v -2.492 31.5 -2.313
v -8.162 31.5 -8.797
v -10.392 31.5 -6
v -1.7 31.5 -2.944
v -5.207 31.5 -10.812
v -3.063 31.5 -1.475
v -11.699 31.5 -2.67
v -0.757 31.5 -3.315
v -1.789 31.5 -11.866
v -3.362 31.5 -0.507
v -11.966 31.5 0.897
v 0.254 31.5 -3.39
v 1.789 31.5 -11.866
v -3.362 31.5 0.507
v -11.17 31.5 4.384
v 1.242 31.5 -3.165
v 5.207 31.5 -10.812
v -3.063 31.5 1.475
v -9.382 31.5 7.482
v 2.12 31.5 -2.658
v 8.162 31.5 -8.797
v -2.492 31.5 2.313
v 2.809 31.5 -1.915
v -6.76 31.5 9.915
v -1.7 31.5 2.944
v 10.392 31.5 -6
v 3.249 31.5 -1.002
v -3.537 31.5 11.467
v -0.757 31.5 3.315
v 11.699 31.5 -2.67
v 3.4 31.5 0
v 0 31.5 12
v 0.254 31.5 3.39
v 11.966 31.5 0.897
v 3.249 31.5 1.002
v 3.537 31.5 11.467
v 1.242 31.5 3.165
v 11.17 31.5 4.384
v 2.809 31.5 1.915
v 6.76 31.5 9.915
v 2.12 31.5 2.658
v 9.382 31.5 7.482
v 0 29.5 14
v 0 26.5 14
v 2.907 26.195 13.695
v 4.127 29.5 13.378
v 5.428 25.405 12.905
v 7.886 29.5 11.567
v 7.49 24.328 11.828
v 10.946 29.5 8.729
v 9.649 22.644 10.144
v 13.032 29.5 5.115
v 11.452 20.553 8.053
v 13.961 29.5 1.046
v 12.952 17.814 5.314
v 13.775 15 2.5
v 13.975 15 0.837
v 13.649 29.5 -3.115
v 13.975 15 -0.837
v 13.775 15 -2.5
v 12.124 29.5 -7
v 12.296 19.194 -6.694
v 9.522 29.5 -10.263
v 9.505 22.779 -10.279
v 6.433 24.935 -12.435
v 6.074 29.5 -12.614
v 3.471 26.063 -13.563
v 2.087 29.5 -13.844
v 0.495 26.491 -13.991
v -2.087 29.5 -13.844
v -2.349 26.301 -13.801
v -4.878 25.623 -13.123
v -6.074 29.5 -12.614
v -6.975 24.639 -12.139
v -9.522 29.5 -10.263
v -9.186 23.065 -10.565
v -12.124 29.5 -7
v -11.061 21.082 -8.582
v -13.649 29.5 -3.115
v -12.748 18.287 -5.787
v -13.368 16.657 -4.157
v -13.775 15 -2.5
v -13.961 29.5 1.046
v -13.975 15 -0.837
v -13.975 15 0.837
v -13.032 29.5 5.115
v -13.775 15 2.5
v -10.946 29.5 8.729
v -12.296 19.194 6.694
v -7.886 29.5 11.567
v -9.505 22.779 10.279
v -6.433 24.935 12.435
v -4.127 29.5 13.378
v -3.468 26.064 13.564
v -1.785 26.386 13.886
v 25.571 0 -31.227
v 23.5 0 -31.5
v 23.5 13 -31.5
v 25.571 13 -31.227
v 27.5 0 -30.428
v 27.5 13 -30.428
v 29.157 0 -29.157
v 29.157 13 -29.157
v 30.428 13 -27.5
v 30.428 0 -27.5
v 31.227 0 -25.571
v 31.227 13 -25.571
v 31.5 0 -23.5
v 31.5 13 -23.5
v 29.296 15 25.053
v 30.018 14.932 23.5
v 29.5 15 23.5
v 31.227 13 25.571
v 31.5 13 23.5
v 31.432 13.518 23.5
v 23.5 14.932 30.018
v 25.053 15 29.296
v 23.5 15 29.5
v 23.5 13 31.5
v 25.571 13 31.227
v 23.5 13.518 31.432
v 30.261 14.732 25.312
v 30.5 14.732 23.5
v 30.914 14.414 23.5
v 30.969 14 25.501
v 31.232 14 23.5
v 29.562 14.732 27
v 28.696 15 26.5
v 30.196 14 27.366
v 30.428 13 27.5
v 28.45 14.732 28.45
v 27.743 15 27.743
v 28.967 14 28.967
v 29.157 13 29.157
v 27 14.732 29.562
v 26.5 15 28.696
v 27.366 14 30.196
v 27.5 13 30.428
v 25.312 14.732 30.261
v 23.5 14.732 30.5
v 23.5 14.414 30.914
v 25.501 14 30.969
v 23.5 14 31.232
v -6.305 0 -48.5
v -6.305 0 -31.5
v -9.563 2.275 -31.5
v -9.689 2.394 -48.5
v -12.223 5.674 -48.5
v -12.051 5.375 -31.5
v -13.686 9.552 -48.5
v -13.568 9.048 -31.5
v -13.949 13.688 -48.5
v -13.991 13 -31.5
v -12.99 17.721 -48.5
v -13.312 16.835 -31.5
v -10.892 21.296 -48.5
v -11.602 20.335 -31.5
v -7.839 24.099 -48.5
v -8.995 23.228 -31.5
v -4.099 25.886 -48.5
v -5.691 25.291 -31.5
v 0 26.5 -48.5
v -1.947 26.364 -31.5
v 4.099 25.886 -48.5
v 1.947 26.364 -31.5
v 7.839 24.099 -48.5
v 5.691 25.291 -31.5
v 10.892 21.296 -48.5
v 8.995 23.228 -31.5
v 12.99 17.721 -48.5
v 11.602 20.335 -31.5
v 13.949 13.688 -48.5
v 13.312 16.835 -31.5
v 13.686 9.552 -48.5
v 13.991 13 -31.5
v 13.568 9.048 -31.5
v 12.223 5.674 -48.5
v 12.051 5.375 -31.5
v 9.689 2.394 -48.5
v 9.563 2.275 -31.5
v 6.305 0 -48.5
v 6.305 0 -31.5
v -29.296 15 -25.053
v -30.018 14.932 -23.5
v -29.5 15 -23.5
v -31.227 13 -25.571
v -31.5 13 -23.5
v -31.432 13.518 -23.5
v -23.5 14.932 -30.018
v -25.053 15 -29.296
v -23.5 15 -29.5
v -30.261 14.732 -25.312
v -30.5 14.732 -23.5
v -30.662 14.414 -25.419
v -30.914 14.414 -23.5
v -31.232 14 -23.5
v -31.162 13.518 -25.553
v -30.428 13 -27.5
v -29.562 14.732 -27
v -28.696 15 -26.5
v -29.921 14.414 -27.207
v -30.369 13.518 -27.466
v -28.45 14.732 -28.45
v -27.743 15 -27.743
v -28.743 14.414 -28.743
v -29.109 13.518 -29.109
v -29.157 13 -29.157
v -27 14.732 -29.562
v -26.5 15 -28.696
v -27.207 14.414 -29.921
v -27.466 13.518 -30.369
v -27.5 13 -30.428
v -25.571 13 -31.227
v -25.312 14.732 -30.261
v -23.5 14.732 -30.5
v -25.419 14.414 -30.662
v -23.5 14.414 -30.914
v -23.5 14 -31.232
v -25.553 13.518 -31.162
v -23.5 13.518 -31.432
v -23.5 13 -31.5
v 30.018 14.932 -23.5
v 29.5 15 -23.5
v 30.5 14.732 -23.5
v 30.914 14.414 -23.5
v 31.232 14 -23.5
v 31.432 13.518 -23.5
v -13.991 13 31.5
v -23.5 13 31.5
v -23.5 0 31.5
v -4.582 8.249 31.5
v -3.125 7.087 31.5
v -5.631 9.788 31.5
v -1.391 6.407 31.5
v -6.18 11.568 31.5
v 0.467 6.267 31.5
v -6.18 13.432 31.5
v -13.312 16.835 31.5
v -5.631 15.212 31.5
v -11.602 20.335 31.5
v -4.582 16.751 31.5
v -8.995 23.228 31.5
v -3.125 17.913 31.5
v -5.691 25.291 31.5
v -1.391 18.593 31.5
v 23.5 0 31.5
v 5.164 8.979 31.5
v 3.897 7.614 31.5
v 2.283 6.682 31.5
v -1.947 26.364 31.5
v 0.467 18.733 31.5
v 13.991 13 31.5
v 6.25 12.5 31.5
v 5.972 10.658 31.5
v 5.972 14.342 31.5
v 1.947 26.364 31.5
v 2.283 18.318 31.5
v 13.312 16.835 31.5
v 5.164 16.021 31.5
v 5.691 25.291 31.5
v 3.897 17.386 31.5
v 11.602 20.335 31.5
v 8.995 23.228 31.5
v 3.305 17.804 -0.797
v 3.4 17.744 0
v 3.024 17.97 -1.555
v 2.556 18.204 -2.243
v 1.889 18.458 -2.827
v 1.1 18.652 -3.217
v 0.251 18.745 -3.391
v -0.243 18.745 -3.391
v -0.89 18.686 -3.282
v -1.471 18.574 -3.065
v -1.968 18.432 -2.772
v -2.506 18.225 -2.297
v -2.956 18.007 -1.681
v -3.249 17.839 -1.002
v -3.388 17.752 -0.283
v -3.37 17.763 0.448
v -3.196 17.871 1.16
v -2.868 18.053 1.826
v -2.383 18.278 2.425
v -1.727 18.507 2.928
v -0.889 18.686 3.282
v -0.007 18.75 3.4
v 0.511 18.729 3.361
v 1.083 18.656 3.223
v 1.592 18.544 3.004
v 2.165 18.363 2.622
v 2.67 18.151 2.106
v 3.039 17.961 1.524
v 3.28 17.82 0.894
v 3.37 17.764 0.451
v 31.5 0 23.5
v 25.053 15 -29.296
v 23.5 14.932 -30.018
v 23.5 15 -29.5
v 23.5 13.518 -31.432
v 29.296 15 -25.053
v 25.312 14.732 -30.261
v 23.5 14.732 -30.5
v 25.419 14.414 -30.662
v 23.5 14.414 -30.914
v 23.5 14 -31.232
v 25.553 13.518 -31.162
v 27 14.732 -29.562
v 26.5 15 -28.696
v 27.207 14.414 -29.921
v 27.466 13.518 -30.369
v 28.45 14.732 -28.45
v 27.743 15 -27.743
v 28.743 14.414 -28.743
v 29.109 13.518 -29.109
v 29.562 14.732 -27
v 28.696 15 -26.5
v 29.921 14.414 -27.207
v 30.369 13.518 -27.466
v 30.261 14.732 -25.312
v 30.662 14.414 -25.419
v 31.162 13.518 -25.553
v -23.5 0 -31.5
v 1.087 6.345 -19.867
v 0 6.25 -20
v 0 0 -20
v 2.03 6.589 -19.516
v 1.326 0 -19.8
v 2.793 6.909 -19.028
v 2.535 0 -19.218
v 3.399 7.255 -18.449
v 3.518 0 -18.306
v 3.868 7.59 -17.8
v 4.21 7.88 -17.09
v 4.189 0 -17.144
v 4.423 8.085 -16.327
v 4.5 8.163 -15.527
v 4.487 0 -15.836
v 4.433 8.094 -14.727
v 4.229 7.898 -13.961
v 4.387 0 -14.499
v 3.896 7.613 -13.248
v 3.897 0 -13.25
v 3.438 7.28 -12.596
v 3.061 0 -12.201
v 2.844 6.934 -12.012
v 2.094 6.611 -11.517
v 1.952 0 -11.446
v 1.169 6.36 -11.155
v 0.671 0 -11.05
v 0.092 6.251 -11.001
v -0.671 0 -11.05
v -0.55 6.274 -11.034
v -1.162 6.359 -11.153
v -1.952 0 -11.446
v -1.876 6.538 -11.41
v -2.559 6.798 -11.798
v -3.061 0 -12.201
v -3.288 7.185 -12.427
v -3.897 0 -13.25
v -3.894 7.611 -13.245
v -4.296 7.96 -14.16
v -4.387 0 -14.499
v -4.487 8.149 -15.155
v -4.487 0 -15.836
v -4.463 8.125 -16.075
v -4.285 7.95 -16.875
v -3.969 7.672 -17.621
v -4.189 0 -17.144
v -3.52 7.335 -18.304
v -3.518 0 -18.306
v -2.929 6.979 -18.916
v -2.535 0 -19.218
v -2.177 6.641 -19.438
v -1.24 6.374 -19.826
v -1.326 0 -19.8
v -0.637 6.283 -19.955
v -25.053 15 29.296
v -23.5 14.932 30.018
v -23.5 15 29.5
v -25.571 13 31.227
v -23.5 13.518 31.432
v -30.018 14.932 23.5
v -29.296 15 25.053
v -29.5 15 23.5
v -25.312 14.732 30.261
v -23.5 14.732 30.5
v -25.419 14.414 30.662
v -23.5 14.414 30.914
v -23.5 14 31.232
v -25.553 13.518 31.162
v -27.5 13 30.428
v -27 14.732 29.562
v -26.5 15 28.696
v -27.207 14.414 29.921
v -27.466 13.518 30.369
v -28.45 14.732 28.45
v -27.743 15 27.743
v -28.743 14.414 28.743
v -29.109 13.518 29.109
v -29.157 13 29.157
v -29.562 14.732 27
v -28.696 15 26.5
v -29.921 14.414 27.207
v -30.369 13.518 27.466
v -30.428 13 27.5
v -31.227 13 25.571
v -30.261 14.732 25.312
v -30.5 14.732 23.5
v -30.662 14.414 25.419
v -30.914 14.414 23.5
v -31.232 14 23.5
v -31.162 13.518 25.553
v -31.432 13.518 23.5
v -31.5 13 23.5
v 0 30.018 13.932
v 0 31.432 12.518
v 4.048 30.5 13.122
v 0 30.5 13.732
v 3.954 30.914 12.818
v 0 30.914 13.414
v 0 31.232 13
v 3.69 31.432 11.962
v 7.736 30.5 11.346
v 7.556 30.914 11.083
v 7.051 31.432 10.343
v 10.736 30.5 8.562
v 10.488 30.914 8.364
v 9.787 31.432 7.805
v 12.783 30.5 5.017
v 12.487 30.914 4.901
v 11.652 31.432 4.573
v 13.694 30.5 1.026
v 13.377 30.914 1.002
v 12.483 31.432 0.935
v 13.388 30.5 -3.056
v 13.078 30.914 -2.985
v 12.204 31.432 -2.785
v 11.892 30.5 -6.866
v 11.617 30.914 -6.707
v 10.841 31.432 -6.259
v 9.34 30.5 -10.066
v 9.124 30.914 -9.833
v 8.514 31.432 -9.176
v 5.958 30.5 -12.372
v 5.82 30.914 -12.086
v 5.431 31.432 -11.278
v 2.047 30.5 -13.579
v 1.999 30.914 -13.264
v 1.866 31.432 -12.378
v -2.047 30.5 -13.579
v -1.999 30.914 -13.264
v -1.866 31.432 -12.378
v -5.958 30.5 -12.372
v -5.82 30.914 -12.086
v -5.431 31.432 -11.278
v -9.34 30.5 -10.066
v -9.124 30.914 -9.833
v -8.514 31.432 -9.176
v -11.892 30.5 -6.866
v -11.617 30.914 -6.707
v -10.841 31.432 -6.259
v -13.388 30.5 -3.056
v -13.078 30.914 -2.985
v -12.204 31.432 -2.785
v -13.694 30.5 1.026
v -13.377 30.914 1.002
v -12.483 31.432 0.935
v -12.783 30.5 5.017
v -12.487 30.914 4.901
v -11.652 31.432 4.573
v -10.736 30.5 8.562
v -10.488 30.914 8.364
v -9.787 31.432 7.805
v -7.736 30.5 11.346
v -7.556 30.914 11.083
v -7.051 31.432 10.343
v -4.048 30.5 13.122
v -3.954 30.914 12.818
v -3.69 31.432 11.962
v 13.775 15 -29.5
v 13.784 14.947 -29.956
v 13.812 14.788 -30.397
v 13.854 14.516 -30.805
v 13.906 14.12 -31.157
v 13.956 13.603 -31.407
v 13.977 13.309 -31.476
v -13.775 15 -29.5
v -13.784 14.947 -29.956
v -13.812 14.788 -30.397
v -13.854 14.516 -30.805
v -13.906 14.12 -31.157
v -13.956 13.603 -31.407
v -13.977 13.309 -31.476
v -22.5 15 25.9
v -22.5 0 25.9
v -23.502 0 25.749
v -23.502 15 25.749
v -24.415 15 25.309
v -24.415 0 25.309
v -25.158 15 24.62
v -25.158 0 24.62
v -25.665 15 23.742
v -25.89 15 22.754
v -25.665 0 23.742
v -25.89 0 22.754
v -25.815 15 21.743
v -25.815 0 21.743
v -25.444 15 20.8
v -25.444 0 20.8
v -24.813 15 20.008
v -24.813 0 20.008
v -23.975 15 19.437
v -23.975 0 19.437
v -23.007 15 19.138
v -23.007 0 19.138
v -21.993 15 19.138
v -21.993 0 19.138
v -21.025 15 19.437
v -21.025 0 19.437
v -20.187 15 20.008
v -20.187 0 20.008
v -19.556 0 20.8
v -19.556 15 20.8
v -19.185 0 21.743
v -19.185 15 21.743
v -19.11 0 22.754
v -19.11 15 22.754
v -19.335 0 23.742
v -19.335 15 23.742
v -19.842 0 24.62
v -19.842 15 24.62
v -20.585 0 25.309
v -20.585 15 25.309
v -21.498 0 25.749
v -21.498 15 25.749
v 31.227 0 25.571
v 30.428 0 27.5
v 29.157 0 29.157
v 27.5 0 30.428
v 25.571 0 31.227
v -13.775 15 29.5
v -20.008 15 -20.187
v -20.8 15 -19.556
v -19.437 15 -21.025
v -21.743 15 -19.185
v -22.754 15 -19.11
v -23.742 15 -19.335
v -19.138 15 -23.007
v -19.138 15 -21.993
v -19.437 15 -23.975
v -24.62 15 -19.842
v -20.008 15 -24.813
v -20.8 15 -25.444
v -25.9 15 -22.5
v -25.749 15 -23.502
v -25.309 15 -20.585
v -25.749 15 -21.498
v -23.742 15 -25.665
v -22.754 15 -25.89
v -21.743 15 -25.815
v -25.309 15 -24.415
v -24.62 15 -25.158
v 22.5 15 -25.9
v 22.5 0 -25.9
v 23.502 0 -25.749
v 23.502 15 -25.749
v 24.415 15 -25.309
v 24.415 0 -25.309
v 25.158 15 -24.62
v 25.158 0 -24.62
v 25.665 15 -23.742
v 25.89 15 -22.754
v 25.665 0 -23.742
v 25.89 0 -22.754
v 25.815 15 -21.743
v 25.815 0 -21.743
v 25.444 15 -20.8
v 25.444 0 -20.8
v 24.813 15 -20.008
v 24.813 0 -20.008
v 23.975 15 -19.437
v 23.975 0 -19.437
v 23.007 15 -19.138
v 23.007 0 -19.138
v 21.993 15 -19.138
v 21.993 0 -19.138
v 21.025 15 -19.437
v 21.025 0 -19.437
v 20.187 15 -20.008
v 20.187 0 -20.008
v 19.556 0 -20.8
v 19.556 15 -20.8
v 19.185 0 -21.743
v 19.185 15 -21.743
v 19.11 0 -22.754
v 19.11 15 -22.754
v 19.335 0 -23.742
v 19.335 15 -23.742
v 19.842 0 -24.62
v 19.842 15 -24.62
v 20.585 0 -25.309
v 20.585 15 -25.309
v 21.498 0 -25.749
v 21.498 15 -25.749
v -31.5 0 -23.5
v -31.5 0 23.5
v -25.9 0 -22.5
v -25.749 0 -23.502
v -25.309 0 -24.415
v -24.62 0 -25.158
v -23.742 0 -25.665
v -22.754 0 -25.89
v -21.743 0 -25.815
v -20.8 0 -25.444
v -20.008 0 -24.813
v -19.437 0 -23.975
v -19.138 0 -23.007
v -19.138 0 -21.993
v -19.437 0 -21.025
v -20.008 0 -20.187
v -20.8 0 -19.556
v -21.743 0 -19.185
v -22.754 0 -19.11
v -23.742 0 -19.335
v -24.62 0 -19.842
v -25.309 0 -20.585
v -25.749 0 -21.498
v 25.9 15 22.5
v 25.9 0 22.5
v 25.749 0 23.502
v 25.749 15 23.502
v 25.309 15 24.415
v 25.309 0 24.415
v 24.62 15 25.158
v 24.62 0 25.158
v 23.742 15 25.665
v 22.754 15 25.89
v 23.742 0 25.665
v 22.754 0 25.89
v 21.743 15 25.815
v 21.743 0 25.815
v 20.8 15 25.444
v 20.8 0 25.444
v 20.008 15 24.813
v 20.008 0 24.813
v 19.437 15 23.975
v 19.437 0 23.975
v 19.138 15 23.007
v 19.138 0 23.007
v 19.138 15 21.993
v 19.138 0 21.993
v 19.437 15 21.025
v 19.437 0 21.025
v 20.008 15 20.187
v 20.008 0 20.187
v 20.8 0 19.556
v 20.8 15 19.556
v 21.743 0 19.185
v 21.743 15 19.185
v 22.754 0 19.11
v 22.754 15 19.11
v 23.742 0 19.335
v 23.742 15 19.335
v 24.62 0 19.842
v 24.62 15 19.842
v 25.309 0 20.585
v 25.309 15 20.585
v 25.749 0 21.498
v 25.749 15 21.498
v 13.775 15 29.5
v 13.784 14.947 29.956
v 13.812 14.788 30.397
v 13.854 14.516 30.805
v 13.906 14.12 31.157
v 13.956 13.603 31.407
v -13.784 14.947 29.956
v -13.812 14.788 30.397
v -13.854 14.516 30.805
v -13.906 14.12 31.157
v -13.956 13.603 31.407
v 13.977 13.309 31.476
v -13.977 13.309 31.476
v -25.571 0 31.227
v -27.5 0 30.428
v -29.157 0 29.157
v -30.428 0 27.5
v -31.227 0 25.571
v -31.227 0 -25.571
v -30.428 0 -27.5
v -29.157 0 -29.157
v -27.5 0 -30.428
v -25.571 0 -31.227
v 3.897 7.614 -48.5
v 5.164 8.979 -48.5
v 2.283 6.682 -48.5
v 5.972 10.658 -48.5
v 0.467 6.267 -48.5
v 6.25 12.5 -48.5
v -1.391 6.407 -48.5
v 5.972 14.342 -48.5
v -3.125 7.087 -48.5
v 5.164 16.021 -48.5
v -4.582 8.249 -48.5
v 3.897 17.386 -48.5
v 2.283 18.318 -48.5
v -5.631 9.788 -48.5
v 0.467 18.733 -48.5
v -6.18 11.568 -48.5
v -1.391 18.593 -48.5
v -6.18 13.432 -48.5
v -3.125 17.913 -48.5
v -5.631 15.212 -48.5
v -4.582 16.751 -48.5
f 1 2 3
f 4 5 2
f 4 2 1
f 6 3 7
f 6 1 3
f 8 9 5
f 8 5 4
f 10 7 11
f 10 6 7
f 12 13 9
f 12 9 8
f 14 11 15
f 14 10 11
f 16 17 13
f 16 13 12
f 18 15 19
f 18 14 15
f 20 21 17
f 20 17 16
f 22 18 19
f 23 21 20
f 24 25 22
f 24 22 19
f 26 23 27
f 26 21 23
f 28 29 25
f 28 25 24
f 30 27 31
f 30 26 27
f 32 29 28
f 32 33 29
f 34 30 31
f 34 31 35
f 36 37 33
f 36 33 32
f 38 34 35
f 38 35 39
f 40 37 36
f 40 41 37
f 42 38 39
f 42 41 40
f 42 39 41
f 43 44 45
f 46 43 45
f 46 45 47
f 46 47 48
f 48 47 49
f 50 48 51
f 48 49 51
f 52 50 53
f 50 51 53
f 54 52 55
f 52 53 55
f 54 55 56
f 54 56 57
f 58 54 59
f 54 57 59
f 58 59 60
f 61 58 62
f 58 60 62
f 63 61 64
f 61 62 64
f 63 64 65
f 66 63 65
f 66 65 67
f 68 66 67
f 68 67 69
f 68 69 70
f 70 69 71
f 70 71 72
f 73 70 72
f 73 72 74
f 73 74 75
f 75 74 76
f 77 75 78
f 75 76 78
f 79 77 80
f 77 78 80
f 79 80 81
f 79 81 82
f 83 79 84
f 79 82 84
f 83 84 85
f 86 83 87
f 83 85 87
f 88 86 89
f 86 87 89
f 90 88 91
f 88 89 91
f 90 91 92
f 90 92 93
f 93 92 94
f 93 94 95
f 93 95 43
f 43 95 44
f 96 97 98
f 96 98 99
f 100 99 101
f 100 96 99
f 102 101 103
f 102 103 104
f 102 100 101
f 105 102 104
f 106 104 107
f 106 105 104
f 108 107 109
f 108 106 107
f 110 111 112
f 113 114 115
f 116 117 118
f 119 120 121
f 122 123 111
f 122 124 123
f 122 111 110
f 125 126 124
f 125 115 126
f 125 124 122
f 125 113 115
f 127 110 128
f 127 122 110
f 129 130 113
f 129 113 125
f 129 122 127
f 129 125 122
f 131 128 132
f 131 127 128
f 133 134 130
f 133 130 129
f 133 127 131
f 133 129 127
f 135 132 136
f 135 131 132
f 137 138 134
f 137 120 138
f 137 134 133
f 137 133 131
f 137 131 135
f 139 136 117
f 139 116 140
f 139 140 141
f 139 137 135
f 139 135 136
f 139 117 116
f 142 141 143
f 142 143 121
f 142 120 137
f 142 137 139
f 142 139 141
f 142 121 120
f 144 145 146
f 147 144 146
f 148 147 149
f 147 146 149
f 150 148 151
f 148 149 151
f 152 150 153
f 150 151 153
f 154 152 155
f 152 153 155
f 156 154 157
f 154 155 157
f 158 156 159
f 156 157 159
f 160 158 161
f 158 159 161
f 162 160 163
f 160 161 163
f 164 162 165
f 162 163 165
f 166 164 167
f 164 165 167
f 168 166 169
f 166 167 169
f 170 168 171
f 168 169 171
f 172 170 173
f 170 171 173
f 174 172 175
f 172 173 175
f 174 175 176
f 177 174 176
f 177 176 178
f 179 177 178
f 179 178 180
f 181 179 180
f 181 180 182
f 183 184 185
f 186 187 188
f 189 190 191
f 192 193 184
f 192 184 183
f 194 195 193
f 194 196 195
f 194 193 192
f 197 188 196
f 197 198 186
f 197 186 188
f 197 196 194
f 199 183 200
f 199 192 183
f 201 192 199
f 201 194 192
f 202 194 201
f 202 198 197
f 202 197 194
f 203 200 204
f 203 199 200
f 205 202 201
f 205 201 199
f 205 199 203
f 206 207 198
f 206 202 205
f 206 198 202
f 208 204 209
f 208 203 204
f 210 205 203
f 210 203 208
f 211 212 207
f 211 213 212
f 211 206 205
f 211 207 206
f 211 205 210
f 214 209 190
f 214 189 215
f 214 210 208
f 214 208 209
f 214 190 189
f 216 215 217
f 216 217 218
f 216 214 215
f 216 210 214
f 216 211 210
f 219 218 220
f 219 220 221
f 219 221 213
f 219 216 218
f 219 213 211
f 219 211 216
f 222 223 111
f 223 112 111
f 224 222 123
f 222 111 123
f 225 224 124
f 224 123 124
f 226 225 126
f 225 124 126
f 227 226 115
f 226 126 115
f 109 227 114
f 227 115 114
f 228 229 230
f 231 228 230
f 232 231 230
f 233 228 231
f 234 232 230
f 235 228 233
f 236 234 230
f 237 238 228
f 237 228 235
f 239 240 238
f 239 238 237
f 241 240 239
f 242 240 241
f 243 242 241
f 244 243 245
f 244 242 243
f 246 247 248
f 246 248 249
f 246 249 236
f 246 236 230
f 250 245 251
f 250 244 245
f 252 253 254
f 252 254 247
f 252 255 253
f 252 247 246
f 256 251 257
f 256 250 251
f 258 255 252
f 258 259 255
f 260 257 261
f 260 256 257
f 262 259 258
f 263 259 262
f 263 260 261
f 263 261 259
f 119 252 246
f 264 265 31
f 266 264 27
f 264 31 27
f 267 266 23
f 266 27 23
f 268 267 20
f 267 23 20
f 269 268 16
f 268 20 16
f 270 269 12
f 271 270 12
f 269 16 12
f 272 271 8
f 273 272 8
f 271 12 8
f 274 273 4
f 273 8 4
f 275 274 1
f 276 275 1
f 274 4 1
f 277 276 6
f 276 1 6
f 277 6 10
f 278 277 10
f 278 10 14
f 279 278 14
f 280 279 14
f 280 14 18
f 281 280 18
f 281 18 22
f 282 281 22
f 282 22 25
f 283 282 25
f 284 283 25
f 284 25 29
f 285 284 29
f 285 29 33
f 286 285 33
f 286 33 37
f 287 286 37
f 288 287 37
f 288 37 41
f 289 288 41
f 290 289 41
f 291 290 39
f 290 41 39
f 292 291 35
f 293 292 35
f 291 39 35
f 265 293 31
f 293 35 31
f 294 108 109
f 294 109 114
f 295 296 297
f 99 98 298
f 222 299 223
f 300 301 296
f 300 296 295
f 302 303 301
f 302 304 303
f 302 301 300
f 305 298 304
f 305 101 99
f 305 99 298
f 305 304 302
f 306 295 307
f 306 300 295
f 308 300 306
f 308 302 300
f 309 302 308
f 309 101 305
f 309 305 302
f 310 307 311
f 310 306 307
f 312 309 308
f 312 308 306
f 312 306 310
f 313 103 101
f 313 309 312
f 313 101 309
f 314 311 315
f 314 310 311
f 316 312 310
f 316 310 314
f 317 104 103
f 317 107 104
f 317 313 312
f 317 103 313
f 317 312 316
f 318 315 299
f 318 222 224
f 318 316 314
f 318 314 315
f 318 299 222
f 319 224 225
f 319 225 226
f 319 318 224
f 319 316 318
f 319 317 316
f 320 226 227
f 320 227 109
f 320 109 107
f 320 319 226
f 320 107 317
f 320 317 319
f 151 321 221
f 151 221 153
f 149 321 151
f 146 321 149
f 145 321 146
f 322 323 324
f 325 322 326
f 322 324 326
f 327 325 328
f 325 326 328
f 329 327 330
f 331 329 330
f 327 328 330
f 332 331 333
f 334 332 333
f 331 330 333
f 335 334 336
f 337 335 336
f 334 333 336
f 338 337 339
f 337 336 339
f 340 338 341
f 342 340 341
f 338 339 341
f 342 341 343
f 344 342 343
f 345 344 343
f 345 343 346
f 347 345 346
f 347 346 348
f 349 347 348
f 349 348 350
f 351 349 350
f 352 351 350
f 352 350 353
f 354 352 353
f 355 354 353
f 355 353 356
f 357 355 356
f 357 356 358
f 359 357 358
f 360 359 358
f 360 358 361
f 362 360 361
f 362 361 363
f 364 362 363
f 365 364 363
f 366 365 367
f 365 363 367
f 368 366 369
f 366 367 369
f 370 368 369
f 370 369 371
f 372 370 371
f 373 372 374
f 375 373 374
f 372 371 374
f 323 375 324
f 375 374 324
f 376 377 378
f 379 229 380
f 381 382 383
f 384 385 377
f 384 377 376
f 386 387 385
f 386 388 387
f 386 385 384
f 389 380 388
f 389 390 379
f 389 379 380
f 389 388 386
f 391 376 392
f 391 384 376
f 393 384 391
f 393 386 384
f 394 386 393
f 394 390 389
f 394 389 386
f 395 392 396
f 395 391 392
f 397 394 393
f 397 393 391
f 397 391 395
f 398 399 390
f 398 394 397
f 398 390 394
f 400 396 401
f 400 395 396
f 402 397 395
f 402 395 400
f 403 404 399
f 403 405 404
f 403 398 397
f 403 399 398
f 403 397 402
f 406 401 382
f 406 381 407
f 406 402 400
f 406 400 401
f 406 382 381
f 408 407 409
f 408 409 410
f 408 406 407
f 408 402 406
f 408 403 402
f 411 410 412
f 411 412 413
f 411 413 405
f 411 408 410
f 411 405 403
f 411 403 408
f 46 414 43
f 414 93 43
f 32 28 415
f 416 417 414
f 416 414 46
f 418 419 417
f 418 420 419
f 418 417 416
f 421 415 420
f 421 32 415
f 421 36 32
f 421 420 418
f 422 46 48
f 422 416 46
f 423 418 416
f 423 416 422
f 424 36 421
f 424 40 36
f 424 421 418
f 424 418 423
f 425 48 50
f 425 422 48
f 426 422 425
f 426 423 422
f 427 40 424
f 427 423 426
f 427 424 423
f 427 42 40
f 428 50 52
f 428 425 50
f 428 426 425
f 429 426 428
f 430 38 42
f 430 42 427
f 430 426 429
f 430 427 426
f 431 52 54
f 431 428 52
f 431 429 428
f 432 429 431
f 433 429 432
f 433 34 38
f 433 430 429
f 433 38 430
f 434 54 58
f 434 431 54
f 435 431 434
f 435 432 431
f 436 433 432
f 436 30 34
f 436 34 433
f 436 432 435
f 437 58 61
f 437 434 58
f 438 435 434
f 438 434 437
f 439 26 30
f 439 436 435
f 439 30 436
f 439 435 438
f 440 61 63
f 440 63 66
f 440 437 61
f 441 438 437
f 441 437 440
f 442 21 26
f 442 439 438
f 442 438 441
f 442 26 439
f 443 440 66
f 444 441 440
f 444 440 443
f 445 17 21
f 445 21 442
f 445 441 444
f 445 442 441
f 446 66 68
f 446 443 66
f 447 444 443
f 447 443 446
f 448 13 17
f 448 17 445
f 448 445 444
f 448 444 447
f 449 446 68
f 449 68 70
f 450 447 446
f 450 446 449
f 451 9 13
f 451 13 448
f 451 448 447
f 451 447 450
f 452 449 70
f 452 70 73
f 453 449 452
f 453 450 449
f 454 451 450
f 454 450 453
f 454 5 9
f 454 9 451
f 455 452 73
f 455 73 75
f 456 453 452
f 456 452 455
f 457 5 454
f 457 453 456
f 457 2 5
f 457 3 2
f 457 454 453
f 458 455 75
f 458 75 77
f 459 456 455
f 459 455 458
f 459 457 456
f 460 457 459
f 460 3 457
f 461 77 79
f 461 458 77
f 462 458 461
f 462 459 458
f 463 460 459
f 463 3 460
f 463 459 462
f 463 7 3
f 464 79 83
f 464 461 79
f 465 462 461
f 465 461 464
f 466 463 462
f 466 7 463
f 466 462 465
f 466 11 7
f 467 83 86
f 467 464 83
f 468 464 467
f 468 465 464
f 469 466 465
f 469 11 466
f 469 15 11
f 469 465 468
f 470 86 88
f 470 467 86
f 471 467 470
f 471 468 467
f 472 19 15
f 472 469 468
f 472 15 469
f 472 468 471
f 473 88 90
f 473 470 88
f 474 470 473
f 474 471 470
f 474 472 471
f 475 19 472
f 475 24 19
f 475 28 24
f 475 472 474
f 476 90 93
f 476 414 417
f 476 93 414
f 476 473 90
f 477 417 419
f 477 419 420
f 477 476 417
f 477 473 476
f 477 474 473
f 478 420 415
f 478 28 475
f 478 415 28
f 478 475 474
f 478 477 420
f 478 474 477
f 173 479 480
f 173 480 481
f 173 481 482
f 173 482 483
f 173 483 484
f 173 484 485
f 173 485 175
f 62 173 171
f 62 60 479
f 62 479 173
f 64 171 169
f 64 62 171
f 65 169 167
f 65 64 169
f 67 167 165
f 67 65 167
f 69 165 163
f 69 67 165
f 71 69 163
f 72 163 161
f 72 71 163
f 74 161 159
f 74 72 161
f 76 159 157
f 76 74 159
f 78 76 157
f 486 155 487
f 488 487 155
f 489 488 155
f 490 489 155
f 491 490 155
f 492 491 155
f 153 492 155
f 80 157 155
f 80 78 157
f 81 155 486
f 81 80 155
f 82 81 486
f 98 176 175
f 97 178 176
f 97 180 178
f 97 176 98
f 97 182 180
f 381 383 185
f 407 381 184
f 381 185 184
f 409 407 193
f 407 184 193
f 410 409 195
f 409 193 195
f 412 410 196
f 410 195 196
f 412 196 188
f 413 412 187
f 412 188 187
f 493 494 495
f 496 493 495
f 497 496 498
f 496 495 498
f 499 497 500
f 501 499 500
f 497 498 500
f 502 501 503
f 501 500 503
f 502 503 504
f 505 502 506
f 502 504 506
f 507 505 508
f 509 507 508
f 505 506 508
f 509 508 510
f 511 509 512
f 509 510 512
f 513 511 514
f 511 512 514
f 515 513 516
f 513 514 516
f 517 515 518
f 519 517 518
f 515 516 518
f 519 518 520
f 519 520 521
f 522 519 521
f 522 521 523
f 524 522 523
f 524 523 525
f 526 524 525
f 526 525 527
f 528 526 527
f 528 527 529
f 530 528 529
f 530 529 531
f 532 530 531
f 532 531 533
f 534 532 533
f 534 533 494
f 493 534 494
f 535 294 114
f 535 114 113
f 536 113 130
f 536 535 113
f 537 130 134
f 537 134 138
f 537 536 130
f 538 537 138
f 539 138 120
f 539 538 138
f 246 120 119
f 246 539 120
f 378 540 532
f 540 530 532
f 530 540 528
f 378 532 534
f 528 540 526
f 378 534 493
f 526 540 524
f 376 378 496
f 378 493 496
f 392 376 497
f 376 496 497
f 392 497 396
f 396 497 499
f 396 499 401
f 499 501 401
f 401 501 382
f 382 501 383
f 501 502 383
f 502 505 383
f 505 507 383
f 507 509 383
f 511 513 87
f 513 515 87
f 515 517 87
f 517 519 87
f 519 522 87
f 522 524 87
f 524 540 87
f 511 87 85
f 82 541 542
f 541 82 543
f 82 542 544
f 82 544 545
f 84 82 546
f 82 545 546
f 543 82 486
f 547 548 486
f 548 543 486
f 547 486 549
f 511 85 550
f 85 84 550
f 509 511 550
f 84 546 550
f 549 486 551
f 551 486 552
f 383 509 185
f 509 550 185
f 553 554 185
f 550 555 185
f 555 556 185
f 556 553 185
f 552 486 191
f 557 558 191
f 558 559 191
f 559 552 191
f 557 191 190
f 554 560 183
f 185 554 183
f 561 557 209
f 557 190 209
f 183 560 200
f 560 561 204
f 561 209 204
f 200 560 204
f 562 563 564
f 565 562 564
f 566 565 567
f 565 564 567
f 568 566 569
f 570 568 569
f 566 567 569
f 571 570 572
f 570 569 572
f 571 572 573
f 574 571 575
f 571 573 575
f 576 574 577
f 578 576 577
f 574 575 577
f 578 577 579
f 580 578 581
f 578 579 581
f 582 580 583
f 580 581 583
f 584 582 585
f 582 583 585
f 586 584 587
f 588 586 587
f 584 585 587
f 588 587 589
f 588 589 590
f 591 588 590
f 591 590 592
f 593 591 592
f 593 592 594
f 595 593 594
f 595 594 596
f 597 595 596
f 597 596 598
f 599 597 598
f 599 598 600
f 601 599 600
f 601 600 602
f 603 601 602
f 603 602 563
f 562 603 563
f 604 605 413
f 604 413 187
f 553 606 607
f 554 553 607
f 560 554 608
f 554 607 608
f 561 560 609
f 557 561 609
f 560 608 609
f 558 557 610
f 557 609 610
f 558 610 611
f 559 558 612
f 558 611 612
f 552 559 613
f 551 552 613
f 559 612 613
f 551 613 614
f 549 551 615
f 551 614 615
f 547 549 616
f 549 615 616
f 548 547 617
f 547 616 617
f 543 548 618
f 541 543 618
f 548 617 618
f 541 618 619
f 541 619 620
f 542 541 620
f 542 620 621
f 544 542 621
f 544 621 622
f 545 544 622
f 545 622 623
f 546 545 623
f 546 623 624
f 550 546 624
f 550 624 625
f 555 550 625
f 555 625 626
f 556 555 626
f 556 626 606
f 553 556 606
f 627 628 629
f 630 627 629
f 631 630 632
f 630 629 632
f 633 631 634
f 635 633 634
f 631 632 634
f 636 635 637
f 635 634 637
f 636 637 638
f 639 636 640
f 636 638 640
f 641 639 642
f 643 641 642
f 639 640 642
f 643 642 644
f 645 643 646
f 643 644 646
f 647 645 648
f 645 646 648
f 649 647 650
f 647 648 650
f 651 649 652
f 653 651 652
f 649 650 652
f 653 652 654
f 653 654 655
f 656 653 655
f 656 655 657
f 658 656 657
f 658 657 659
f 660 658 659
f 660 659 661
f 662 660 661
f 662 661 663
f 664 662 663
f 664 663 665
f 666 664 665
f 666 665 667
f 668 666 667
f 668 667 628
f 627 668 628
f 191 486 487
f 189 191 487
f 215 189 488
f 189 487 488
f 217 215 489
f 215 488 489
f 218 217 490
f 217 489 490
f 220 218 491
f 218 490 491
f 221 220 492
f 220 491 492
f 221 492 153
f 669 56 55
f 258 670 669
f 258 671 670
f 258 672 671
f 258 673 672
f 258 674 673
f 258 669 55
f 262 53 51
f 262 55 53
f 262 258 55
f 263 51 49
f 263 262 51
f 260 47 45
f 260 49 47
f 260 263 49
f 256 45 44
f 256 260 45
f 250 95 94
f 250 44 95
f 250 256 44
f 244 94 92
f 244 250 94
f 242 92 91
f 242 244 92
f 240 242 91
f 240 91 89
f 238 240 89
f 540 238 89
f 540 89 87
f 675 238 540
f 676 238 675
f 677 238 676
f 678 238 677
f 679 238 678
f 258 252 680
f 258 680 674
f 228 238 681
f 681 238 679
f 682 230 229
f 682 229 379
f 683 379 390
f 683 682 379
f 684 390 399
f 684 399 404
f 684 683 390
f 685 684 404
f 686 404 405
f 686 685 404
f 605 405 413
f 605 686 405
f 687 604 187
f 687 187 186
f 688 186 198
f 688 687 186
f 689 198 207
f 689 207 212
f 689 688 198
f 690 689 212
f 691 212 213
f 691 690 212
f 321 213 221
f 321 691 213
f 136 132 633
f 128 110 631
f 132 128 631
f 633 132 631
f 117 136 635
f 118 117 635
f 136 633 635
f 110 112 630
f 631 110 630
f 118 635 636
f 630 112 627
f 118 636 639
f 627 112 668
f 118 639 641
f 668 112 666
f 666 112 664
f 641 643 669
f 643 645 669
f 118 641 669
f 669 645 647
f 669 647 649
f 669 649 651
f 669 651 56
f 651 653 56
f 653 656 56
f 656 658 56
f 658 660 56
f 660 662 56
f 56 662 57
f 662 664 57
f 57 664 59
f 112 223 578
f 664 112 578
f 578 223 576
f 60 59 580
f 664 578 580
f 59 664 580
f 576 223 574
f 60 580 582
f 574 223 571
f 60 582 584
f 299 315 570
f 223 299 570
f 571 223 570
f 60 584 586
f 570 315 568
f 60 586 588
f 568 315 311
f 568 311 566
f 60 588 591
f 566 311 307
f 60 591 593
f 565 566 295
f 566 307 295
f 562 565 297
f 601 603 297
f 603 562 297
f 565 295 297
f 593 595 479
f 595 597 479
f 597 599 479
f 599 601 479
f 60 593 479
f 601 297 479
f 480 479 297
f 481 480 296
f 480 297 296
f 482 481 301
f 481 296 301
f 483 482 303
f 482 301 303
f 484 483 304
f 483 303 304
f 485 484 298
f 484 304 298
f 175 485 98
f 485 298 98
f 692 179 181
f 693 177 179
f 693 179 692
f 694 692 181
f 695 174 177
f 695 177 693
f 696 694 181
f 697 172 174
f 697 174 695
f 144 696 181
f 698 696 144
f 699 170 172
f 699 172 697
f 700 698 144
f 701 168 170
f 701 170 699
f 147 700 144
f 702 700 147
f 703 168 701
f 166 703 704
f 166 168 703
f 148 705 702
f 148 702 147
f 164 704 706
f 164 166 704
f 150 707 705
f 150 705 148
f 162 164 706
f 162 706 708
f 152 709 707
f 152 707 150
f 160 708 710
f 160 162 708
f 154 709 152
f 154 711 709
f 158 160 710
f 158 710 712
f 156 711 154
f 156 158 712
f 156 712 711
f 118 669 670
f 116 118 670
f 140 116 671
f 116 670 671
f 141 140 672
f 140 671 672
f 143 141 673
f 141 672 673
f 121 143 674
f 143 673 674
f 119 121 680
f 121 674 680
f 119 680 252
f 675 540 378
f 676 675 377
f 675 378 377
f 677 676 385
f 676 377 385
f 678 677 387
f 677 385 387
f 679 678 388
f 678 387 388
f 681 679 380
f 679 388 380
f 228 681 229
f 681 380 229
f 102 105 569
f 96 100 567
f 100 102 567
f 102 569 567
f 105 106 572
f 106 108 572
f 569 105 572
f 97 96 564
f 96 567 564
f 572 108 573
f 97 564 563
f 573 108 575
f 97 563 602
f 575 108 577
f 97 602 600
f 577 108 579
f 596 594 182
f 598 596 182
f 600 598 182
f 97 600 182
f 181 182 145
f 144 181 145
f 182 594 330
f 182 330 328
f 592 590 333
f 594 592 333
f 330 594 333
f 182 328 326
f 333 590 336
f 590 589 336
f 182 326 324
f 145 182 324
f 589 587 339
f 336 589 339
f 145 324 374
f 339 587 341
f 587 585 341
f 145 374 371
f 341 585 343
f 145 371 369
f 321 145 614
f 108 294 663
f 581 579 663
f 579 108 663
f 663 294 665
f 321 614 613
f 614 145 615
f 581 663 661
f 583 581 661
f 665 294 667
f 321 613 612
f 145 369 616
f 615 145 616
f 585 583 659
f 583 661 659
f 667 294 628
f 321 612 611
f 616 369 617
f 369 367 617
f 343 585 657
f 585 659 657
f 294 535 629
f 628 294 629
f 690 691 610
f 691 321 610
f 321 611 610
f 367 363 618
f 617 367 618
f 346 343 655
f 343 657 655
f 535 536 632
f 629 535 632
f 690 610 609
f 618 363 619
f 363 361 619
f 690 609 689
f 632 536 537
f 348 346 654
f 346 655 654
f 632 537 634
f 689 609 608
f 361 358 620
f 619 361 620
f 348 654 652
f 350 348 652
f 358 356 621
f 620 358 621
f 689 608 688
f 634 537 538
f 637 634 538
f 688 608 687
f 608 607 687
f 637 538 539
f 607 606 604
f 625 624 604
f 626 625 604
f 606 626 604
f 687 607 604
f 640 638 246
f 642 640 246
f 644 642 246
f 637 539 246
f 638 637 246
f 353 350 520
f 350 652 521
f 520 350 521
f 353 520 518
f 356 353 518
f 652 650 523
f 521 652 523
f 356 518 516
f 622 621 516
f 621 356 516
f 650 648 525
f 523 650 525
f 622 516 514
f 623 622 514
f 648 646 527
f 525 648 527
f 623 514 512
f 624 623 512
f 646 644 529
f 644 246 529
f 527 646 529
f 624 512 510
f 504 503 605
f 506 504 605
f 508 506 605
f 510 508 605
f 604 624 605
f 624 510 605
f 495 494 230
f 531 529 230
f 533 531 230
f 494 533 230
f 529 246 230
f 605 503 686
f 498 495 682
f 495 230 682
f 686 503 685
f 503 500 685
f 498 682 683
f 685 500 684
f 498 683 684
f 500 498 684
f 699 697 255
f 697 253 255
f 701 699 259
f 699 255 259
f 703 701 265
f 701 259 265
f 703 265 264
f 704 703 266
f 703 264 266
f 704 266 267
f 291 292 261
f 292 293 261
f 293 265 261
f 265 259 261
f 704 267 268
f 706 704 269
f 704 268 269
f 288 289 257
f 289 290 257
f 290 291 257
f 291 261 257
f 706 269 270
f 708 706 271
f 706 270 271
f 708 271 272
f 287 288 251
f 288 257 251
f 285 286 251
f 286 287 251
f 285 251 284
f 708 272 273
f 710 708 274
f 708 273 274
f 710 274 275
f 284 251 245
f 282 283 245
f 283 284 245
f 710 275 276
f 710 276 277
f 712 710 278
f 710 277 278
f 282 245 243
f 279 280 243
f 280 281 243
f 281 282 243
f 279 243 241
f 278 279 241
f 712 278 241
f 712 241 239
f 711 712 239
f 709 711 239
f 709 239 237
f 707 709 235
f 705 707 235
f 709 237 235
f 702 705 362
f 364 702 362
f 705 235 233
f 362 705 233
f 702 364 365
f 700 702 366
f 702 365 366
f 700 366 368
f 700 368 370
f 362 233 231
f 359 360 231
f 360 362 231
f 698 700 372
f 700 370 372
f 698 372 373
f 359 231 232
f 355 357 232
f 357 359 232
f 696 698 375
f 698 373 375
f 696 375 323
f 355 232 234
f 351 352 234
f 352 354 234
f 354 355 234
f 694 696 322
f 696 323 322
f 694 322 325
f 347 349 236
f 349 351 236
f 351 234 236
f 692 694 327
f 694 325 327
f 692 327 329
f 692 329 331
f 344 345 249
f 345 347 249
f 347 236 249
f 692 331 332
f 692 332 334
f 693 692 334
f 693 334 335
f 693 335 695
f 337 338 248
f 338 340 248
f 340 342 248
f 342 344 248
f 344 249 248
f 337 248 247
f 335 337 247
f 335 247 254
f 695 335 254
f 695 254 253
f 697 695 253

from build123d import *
from build123d.topology import SkipClean

# Parameters (mm, degrees)
EXTRUDE_1_DEPTH          = 15
SKETCH_2_R               = 14
EXTRUDE_2_DEPTH          = 16.5
FILLET_1_R               = 2
EXTRUDE_3_DEPTH          = 17
EXTRUDE_START            = 63
EXTRUDE_4_DEPTH          = 63
M14X1_5_1_D              = 12.5
HOLE_WIZARD_M8_1_REACH   = 67.854
HOLE_WIZARD_M8_1_BORE_R  = 3.4
CUT_EXTRUDE_1_REACH      = 67.854
CUT_EXTRUDE_1_END_RADIUS = 6.25
SKETCH_9_R               = 4.5
HOLE_WIZARD_M8_2_D       = 6.8
PATTERN_CIRCULAR_1_COUNT = 4


with BuildPart() as part:
    # 草图1 → 凸台-拉伸1 (new body)
    with BuildSketch(Plane(origin=(0, 0, 0), x_dir=(1, 0, 0), z_dir=(0, 1, 0))):
        with BuildLine():
            Line((-23.5, 31.5), (23.5, 31.5))
            ThreePointArc((23.5, 31.5), (29.156854249, 29.156854249), (31.5, 23.5))
            Line((31.5, 23.5), (31.5, -23.5))
            ThreePointArc((31.5, -23.5), (29.156854249, -29.156854249), (23.5, -31.5))
            Line((23.5, -31.5), (-23.5, -31.5))
            ThreePointArc((-23.5, -31.5), (-29.156854249, -29.156854249), (-31.5, -23.5))
            Line((-31.5, -23.5), (-31.5, 23.5))
            ThreePointArc((-31.5, 23.5), (-29.156854249, 29.156854249), (-23.5, 31.5))
        make_face()
    extrude(amount=EXTRUDE_1_DEPTH)

    # 草图2 → 凸台-拉伸2 (add)
    with BuildSketch(Plane(origin=(0, 15, 0), x_dir=(1, 0, 0), z_dir=(0, 1, 0))):
        with Locations(Location((0, 0, 0), (0, 0, 270))):
            Circle(SKETCH_2_R)
    extrude(amount=EXTRUDE_2_DEPTH)

    # 圆角1
    fillet_1_edges = [part.edges().sort_by_distance(p)[0] for p in [
        (29.156854249, 15, 29.156854249),
        (31.5, 15, 0),
        (29.156854249, 15, -29.156854249),
        (0, 15, -31.5),
        (0, 31.5, -14),
        (-29.156854249, 15, -29.156854249),
        (-31.5, 15, 0),
        (-29.156854249, 15, 29.156854249),
        (0, 15, 31.5),
    ]]
    fillet(fillet_1_edges, radius=FILLET_1_R)

    # 草图3 → 凸台-拉伸3 (add)
    with BuildSketch(Plane(origin=(0, 0, -31.5), x_dir=(-1, 0, 0), z_dir=(0, 0, -1))):
        with BuildLine():
            Line((-6.304760106, 0), (6.304760106, 0))
            ThreePointArc((6.304760106, 0), (0, 26.5), (-6.304760106, 0))
        make_face()
    extrude(amount=EXTRUDE_3_DEPTH)

    # 草图4 → 凸台-拉伸4 (add)
    with SkipClean():  # the faces are left unmerged after this step: merging them gives an invalid solid
        with BuildSketch(Plane.XY.offset(-31.5).offset(EXTRUDE_START)):
            with BuildLine():
                Line((-13.99106858, 13), (13.99106858, 13))
                ThreePointArc((13.99106858, 13), (0, 26.5), (-13.99106858, 13))
            make_face()
        extrude(amount=-EXTRUDE_4_DEPTH)

    # M14x1.5 螺纹孔1 (through all)
    with Locations(Plane(origin=(0, 0, -48.5), x_dir=(-1, 0, 0), z_dir=(0, 0, -1))):
        with Locations((0, 12.5)):
            Hole(M14X1_5_1_D / 2)

    # M8 螺纹孔1 bore → M8 螺纹孔1 (cut, up to next)
    with BuildSketch(Plane(origin=(0, 31.5, 0), x_dir=(1, 0, 0), z_dir=(0, 1, 0)), mode=Mode.PRIVATE) as hole_wizard_m8_1_sk1:
        Circle(HOLE_WIZARD_M8_1_BORE_R)
    hole_wizard_m8_1_tool1 = extrude(hole_wizard_m8_1_sk1.sketch, amount=-HOLE_WIZARD_M8_1_REACH, mode=Mode.PRIVATE) & part.part
    add(hole_wizard_m8_1_tool1.solids().sort_by_distance((0, 31.5, 0))[0], mode=Mode.SUBTRACT)

    # 切除-拉伸1: up to this cylinder (the profile starts outside it)
    with SkipClean():  # the faces are left unmerged after this step: merging them gives an invalid solid
        cut_extrude_1_end = Plane(origin=(0, 12.5, -15.5), z_dir=(0, 0, -1)) * Cylinder(CUT_EXTRUDE_1_END_RADIUS, 149.208, mode=Mode.PRIVATE)
        # 草图9 → 切除-拉伸1 (cut, up to the surface)
        with BuildSketch(Plane.XZ, mode=Mode.PRIVATE) as cut_extrude_1_sk1:
            with Locations(Location((0, -15.5, 0), (0, 0, 270))):
                Circle(SKETCH_9_R)
        cut_extrude_1_tool1 = extrude(cut_extrude_1_sk1.sketch, amount=-CUT_EXTRUDE_1_REACH, mode=Mode.PRIVATE) - cut_extrude_1_end
        add(cut_extrude_1_tool1.solids().sort_by_distance((0, 0, -15.5))[0], mode=Mode.SUBTRACT)

    # M8 螺纹孔2 (through all)
    with Locations(Plane(origin=(0, 15, 0), x_dir=(1, 0, 0), z_dir=(0, 1, 0))):
        with Locations((-22.5, 22.5)):
            hole_wizard_m8_2 = Hole(HOLE_WIZARD_M8_2_D / 2)

    # 阵列(圆周)1: M8 螺纹孔2 ×4 about axis
    with SkipClean():  # the faces are left unmerged after this step: merging them gives an invalid solid
        pattern_circular_1_axis = Axis((0, 0, 0), (0, 1, 0))
        for i in range(1, PATTERN_CIRCULAR_1_COUNT):
            add(hole_wizard_m8_2.rotate(pattern_circular_1_axis, i * 360 / PATTERN_CIRCULAR_1_COUNT), mode=Mode.SUBTRACT)


solid = part.part
